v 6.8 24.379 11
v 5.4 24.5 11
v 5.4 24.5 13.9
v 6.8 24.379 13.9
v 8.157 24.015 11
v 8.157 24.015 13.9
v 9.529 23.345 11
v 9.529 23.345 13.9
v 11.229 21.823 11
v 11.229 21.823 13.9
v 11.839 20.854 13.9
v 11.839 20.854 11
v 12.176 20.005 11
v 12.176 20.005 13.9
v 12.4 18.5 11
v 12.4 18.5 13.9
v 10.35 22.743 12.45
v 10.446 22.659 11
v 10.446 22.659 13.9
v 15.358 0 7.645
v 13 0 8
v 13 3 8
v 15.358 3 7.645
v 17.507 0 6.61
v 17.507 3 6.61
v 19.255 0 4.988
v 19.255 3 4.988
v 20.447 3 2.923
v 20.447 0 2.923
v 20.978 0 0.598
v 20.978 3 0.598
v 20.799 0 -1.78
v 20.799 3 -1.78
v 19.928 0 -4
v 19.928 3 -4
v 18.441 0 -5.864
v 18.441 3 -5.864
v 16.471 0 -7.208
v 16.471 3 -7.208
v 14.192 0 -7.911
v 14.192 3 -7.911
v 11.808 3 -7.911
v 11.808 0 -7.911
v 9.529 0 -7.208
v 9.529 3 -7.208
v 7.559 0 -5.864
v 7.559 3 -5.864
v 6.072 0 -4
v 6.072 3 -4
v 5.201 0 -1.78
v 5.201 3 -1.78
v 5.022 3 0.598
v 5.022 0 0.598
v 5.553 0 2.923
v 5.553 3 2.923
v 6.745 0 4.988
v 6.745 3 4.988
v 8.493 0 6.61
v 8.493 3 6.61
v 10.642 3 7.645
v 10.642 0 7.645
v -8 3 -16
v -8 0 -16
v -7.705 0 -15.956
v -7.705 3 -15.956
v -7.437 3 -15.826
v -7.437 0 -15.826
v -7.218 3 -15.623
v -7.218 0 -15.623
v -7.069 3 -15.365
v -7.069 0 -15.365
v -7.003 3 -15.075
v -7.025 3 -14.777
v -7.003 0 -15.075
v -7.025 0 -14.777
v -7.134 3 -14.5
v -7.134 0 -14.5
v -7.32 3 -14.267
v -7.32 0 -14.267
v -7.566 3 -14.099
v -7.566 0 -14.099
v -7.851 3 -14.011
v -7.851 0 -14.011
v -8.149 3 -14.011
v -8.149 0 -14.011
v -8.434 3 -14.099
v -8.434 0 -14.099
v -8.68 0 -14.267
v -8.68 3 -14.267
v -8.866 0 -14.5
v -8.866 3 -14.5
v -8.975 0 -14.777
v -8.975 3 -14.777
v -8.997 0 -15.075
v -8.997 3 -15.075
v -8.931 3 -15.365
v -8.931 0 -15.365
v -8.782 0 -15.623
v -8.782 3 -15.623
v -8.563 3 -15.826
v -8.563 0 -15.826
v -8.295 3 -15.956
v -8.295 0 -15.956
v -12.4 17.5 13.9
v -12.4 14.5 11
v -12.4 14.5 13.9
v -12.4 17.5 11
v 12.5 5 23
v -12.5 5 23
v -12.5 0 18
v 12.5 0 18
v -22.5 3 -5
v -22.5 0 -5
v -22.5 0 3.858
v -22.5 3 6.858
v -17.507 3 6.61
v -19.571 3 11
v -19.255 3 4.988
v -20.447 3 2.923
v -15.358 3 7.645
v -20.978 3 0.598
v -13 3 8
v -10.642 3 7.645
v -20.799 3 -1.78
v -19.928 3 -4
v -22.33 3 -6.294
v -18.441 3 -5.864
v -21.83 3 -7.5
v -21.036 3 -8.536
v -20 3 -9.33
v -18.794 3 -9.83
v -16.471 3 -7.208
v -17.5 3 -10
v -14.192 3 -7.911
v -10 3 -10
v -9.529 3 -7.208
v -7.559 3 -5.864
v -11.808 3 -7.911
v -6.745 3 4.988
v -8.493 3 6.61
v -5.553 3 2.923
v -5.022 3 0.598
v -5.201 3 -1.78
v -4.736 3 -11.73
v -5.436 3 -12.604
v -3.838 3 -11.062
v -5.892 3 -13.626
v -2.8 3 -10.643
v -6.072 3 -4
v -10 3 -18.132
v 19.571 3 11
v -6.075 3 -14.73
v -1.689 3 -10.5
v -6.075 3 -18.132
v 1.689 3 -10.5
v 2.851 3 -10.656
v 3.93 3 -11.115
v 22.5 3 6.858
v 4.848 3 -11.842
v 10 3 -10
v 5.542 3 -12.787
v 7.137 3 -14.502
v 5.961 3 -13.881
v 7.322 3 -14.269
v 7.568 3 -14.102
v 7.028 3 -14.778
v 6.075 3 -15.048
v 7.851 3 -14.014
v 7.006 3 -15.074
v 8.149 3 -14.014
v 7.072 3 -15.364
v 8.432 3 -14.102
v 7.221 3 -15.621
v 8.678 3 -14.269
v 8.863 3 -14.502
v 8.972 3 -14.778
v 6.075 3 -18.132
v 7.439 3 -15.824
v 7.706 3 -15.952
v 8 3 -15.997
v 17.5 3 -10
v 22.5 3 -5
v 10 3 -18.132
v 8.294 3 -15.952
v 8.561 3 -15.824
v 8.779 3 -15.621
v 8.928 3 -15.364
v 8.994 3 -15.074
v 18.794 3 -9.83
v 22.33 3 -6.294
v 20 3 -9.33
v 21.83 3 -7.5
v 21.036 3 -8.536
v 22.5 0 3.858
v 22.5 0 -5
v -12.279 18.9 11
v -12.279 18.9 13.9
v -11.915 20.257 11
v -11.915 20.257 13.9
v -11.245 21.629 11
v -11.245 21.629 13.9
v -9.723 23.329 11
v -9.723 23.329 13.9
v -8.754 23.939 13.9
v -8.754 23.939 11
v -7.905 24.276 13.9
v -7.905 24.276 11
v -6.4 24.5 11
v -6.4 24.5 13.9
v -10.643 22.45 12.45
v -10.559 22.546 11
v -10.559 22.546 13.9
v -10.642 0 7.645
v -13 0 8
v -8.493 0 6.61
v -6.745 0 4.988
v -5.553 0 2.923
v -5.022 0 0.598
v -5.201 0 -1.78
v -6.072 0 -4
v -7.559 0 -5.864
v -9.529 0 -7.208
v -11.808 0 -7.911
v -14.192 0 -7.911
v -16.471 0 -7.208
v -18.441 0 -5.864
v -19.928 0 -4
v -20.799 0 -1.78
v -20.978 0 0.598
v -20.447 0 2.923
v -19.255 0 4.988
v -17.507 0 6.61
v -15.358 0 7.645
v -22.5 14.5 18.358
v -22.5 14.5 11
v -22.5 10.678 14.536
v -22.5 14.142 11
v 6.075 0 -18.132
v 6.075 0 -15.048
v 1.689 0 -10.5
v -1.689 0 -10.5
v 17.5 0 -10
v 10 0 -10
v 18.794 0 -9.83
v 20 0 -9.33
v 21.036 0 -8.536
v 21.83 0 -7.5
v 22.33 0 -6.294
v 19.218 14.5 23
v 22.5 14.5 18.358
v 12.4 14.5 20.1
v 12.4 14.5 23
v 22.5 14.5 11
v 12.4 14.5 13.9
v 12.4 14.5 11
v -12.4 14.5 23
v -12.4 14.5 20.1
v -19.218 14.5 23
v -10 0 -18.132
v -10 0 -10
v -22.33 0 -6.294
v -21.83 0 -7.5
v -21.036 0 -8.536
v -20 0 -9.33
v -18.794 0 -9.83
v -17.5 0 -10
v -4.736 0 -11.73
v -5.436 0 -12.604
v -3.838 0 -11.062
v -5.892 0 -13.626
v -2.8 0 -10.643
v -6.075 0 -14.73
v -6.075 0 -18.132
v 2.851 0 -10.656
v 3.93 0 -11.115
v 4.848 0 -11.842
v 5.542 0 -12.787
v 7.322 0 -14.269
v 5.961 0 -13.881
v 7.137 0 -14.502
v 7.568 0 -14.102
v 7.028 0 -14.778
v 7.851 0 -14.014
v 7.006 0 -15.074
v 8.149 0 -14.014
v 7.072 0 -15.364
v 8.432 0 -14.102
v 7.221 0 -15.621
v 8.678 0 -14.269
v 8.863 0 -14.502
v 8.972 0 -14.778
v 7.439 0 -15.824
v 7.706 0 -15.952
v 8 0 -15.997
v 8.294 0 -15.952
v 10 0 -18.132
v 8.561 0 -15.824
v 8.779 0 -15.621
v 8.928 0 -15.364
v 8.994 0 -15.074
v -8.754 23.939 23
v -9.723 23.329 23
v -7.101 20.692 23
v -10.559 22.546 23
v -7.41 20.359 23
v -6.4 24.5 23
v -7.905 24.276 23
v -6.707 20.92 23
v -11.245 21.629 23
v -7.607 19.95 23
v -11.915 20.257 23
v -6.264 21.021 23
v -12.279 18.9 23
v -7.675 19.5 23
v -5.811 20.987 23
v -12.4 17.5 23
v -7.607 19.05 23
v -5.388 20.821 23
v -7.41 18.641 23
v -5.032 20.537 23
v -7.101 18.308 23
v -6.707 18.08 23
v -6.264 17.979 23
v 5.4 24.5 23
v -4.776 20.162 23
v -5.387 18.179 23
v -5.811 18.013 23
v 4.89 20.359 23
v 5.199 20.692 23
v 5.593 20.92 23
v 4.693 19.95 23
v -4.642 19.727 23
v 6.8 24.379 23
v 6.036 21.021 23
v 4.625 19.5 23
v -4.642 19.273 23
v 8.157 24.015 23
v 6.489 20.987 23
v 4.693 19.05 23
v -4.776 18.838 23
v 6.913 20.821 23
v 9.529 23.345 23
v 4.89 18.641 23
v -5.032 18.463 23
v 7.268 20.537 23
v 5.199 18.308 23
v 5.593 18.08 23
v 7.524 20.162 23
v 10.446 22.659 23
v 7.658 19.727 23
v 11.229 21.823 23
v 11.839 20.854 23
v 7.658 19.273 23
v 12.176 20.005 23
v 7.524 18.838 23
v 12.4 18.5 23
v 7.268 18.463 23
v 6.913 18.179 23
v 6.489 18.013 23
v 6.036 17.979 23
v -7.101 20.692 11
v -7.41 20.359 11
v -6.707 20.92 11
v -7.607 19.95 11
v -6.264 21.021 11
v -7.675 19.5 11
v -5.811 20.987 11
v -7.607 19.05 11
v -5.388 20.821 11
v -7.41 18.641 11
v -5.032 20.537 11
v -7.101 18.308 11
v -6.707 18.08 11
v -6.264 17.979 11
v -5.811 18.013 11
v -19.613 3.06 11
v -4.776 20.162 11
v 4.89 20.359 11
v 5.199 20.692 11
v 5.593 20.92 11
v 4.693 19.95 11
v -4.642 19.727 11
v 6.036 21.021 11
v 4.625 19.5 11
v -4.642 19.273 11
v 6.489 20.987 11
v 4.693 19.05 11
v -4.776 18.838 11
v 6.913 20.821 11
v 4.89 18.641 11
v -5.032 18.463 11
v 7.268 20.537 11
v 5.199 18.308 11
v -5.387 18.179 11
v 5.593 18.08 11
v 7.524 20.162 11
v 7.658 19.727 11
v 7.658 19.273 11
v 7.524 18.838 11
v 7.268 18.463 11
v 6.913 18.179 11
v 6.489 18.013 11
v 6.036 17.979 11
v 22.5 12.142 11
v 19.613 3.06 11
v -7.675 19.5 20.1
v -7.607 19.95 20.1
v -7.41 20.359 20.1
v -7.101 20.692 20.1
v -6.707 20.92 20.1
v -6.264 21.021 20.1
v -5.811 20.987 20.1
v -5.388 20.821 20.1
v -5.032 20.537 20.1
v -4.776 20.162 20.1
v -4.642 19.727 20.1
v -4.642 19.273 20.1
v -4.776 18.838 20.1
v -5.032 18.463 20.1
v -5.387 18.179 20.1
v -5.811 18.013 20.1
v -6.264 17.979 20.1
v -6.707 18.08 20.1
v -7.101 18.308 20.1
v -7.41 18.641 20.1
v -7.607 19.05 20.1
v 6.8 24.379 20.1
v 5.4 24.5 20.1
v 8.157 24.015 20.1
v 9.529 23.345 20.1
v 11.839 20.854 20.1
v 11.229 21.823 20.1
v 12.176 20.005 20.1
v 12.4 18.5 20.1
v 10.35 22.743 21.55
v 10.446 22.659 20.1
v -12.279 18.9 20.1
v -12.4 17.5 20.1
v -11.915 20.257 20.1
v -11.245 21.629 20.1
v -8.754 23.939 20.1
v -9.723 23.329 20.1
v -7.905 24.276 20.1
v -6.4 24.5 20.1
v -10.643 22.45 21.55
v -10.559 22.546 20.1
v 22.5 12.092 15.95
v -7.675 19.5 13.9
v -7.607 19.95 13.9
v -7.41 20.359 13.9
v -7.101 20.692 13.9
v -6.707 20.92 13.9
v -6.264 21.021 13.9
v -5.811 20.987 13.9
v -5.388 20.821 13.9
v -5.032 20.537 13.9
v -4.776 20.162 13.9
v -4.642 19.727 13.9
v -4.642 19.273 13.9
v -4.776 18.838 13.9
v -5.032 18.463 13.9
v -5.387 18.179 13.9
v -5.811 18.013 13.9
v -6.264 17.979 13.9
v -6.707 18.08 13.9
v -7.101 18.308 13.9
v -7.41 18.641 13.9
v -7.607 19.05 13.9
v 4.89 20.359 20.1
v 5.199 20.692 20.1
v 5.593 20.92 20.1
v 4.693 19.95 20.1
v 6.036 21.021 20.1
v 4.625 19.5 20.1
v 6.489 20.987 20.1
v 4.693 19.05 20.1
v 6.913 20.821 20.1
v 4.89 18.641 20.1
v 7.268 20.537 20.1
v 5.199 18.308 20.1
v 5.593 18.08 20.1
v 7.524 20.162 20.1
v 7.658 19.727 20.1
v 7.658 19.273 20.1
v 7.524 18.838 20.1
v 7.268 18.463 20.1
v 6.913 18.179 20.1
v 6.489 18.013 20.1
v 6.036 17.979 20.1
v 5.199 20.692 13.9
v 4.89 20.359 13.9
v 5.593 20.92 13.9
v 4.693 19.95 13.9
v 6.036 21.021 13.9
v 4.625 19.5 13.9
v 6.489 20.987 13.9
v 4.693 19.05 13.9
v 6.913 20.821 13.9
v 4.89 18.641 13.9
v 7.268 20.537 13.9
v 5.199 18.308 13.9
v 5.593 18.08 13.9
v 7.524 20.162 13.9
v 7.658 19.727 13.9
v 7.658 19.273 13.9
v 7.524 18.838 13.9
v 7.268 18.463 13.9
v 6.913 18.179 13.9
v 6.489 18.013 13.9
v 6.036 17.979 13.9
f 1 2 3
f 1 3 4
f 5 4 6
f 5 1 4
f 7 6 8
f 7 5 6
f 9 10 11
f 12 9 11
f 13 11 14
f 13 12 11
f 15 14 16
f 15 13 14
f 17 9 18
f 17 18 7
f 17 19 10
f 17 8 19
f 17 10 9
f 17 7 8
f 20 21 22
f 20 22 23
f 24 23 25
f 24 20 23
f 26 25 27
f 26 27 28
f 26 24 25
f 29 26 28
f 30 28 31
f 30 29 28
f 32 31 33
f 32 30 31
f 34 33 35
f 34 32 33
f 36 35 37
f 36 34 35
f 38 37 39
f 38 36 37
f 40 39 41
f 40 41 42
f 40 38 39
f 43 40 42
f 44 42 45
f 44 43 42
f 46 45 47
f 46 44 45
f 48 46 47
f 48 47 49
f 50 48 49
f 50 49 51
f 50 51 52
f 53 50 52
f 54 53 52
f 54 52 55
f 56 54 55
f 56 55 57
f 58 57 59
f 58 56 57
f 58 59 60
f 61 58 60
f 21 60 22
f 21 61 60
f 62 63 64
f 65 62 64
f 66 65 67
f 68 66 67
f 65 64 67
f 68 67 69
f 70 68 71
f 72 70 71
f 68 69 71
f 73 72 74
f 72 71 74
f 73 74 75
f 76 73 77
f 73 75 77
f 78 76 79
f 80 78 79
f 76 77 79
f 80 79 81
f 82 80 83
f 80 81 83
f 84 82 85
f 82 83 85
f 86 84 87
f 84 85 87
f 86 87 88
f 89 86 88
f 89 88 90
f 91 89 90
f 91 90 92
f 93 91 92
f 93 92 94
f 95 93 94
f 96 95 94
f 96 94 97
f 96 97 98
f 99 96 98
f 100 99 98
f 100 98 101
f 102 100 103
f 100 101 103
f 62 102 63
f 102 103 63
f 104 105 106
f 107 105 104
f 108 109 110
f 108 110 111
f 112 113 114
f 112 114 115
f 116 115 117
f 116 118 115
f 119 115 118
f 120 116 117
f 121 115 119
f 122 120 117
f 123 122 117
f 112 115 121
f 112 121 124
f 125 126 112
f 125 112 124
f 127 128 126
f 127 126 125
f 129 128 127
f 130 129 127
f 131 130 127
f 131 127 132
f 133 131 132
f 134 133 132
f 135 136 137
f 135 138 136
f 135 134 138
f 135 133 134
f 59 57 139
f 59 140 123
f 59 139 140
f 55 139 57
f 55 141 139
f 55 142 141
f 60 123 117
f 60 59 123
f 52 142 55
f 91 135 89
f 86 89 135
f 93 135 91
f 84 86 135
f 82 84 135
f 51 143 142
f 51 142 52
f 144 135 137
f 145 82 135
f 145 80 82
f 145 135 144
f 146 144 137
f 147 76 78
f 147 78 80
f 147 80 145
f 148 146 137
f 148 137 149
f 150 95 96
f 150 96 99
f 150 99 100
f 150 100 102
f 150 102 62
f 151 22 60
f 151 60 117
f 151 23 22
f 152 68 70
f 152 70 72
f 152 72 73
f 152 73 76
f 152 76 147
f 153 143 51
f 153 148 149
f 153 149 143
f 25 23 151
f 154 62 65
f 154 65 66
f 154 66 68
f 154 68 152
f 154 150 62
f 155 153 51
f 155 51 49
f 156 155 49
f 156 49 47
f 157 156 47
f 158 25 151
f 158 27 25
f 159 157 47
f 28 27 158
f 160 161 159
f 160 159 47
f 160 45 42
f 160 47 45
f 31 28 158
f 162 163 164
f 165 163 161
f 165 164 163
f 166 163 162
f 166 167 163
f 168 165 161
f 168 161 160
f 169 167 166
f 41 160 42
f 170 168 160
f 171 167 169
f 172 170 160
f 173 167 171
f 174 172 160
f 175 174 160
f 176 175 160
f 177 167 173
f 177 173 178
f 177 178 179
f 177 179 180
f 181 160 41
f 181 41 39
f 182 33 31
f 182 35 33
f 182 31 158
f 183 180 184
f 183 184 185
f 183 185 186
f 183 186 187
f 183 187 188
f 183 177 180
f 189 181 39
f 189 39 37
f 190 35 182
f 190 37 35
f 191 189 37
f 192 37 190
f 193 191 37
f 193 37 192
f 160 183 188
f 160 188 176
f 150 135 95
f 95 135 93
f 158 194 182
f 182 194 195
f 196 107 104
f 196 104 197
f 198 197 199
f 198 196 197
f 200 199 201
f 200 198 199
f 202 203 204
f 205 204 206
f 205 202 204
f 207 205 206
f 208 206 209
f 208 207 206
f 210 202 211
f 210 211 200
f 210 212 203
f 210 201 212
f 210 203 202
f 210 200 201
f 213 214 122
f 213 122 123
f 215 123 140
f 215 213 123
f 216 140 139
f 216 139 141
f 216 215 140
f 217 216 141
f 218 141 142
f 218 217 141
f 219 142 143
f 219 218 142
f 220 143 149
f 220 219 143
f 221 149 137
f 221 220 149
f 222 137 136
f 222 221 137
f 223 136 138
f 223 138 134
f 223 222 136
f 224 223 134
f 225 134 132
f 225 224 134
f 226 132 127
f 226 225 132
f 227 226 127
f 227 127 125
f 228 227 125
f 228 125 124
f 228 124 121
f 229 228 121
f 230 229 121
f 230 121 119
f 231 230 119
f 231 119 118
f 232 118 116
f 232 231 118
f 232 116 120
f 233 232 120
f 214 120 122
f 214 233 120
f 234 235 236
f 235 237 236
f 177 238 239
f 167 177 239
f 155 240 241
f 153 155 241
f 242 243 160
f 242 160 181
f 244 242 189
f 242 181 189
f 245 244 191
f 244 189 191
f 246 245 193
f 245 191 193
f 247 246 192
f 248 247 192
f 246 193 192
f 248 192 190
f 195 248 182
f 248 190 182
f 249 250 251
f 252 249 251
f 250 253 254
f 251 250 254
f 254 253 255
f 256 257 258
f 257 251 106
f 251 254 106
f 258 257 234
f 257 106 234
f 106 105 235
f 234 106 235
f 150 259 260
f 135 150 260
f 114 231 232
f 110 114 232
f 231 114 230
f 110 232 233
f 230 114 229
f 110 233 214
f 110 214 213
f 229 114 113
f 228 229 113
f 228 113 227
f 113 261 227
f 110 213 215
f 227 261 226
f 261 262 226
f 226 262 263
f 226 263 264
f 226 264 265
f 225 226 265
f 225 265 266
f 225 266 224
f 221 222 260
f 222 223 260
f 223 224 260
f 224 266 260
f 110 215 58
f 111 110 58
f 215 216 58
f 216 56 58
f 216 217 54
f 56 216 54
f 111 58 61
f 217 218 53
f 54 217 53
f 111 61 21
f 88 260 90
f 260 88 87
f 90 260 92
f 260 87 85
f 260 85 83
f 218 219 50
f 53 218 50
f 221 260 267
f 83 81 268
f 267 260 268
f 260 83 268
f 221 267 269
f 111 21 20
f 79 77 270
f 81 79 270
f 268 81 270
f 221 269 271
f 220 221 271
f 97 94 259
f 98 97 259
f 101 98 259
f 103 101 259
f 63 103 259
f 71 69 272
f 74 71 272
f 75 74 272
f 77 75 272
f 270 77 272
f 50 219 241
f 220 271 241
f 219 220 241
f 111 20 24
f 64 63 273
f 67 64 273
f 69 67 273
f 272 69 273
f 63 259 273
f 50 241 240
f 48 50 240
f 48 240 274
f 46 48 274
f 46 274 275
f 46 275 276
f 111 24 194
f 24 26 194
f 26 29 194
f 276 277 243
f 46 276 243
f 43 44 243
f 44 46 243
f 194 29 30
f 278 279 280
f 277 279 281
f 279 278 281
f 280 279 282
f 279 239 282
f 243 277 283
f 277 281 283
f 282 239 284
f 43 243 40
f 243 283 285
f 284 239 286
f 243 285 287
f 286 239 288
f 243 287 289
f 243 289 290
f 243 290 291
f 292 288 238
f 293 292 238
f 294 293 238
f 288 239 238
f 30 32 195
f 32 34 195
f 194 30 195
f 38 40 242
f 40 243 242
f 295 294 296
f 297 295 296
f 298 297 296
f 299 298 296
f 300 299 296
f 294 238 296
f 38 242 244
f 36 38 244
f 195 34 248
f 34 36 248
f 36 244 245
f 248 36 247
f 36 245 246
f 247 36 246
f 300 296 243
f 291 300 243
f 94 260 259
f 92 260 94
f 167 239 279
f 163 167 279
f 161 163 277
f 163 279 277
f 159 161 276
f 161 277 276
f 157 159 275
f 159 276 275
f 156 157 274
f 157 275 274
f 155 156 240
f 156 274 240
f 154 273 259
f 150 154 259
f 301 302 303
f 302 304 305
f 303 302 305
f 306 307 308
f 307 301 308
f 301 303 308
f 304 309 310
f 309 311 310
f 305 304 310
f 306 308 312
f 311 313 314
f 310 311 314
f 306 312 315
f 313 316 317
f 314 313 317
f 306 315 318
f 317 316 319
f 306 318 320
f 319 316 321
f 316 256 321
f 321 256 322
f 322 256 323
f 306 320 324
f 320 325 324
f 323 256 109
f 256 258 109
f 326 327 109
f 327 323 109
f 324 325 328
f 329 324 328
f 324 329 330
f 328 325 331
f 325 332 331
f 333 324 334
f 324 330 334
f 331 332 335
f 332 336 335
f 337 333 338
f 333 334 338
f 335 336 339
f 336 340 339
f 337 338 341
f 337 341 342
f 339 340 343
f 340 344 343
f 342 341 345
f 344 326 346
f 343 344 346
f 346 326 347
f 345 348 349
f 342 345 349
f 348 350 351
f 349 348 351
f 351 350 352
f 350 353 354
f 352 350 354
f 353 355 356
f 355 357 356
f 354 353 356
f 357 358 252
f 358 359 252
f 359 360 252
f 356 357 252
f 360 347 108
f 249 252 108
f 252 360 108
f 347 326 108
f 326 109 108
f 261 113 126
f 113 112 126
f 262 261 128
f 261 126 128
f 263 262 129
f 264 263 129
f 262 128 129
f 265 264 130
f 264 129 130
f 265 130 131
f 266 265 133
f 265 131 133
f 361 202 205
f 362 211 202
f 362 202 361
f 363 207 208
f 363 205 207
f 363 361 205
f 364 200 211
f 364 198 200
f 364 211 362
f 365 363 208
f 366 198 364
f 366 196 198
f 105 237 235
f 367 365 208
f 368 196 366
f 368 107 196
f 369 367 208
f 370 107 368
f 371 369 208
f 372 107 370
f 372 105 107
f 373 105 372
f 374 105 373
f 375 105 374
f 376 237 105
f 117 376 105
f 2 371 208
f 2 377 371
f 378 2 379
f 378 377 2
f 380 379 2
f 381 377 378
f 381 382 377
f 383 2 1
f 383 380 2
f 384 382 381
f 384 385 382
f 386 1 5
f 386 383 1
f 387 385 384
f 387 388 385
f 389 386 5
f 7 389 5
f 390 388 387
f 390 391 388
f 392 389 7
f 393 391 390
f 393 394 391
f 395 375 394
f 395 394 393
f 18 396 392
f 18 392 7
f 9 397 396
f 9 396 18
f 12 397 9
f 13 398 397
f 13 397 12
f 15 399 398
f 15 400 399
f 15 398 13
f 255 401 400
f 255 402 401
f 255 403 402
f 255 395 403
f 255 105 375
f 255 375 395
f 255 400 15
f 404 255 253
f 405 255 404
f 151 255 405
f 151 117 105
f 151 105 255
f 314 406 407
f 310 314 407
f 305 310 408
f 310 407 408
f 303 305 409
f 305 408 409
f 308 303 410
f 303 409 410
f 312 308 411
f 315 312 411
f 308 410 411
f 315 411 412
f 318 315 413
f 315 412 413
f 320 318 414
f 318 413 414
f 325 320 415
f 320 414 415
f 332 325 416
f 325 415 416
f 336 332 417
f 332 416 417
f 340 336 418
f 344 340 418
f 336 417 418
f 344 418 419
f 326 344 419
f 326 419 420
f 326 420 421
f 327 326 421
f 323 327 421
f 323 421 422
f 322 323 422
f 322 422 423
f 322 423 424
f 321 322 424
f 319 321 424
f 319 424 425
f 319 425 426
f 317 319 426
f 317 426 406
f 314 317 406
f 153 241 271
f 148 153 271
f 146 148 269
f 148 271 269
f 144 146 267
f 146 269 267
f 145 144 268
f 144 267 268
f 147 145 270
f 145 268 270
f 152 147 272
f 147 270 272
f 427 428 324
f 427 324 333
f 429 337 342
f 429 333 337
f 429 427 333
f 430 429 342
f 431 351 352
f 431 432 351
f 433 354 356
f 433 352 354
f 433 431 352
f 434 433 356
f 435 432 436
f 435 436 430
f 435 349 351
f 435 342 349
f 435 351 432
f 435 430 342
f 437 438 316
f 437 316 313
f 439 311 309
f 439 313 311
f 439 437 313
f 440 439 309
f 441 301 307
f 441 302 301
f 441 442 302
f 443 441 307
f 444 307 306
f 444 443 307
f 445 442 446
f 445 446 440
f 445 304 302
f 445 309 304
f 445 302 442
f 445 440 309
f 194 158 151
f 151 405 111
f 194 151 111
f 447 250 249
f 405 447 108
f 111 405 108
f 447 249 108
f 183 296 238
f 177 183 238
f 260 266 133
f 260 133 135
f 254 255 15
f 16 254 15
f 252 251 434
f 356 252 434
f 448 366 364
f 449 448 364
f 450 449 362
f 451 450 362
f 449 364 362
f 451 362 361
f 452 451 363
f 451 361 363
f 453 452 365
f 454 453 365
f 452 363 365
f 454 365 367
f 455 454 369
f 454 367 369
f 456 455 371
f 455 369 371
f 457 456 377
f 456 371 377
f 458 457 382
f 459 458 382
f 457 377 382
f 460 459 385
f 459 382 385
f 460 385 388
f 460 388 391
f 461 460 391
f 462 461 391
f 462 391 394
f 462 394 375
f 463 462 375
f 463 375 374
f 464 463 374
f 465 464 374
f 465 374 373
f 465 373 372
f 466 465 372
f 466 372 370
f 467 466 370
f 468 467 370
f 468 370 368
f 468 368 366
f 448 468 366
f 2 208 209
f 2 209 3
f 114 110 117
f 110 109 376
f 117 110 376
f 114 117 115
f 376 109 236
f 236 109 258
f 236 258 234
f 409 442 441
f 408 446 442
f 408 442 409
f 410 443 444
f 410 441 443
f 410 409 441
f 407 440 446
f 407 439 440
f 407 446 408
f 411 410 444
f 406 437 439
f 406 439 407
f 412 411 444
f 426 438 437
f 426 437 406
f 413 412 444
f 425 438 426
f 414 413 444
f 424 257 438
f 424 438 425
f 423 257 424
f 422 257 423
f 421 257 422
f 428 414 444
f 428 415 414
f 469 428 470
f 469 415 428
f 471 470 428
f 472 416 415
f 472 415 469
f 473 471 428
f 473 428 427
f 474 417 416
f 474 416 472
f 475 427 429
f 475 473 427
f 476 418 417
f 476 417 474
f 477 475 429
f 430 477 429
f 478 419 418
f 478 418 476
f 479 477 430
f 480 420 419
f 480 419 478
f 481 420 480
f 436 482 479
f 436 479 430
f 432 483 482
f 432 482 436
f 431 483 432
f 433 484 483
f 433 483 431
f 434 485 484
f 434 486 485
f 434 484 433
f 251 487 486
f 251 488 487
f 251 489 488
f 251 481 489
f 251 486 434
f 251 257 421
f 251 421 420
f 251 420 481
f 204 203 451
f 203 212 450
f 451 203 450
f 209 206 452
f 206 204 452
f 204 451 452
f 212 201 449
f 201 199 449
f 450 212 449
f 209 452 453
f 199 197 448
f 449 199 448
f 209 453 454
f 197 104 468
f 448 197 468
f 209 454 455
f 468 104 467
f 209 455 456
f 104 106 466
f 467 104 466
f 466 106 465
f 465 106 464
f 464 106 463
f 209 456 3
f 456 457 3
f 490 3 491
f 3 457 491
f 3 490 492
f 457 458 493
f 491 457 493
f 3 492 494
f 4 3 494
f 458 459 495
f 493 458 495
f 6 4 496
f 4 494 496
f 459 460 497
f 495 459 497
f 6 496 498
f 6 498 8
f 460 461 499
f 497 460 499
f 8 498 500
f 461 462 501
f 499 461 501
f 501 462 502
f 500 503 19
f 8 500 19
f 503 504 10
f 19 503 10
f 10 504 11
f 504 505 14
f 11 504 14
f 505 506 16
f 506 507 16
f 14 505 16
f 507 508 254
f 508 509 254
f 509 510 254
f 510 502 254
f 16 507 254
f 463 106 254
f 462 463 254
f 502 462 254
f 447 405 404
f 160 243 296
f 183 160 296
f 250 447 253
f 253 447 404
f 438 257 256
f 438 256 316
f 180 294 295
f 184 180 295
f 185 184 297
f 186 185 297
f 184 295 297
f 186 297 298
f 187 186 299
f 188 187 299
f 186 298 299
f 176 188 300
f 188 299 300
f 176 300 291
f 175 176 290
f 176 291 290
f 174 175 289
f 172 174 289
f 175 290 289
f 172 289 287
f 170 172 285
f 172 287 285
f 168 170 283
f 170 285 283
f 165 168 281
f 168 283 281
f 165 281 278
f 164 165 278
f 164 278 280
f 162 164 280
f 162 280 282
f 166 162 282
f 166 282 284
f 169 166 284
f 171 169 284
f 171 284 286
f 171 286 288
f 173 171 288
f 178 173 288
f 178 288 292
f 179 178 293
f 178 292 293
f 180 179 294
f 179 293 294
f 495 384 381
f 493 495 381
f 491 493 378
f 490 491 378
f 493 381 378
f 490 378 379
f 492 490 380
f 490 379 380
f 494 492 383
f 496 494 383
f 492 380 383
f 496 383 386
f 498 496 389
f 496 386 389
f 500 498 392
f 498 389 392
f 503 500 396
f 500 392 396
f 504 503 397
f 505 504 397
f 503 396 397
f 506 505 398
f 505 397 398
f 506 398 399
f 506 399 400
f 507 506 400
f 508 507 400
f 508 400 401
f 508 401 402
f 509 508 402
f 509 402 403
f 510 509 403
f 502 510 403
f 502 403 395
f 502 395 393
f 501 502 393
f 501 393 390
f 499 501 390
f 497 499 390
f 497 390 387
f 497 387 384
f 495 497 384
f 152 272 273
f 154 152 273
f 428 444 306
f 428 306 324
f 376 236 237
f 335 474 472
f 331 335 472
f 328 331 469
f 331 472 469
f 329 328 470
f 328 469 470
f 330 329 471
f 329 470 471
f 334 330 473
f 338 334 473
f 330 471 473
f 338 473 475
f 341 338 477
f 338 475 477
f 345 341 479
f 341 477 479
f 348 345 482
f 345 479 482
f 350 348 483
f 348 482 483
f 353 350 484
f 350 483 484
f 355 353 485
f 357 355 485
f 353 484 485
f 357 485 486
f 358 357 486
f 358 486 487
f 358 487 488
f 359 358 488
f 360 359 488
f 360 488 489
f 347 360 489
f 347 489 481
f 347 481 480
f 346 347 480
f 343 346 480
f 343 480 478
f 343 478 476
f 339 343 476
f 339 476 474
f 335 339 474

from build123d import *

# Parameters (mm, degrees)
SKETCH1_W           = 45
SKETCH1_H           = 20
SKETCH1_R           = 8
SKETCH1_H_2         = 13
SKETCH1_H_3         = 1
BOSS_EXTRUDE1_DEPTH = 3
SKETCH3_W           = 45
SKETCH3_H           = 2.9
SKETCH3_H_2         = 6.2
BOSS_EXTRUDE2_DEPTH = 11.5
SKETCH3_3_W         = 45
SKETCH3_3_H         = 2.9
BOSS_EXTRUDE3_DEPTH = 21.5
SKETCH6_R           = 1.525
SKETCH6_W           = 10.1
SKETCH6_H           = 10
CUT_EXTRUDE2_DEPTH  = 16.5
CHAMFER1_SIZE       = 5
FILLET2_R           = 5
FILLET3_SIZE        = 7
FILLET3_SIZE_2      = 6
SKETCH7_R           = 0.996709825
SKETCH7_R_2         = 1
BOSS_EXTRUDE4_DEPTH = 3
CHAMFER2_SIZE       = 10
CHAMFER3_SIZE       = 10
CHAMFER4_START      = 17.731133084
CHAMFER4_DEPTH      = 3.699865449
CHAMFER5_START      = -16.752681828
CHAMFER5_DEPTH      = 1.71299366


with BuildPart() as part:
    # Sketch1 → Boss-Extrude1 (new body)
    # profile 1 of 3: a face of its own
    with BuildSketch(Plane(origin=(0, 0, 0), x_dir=(1, 0, 0), z_dir=(0, 1, 0))):
        Rectangle(SKETCH1_W, SKETCH1_H)
        with Locations(Location((13, 0, 0), (0, 0, 270))):
            Circle(SKETCH1_R, mode=Mode.SUBTRACT)
        with Locations(Location((-13, 0, 0), (0, 0, 270))):
            Circle(SKETCH1_R, mode=Mode.SUBTRACT)
    # profile 2 of 3: a face of its own
    with BuildSketch(Plane(origin=(0, 0, 0), x_dir=(1, 0, 0), z_dir=(0, 1, 0))):
        with Locations((0, -16.5)):
            Rectangle(SKETCH1_W, SKETCH1_H_2)
    # profile 3 of 3: a face of its own
    with BuildSketch(Plane(origin=(0, 0, 0), x_dir=(1, 0, 0), z_dir=(0, 1, 0))):
        with Locations((0, -10.5)):
            Rectangle(SKETCH1_W, SKETCH1_H_3)
    extrude(amount=BOSS_EXTRUDE1_DEPTH)

    # Sketch3 → Boss-Extrude2 (add)
    with BuildSketch(Plane(origin=(0, 3, 0), x_dir=(1, 0, 0), z_dir=(0, 1, 0))):
        with Locations((0, -21.55)):
            Rectangle(SKETCH3_W, SKETCH3_H)
        with Locations((0, -17)):
            Rectangle(SKETCH3_W, SKETCH3_H_2)
        with Locations((0, -12.45)):
            Rectangle(SKETCH3_W, SKETCH3_H)
    extrude(amount=BOSS_EXTRUDE2_DEPTH)

    # Sketch3<3> → Boss-Extrude3 (add)
    with BuildSketch(Plane(origin=(0, 3, 0), x_dir=(1, 0, 0), z_dir=(0, 1, 0))):
        with Locations((0, -12.45)):
            Rectangle(SKETCH3_3_W, SKETCH3_3_H)
        with Locations((0, -21.55)):
            Rectangle(SKETCH3_3_W, SKETCH3_3_H)
    extrude(amount=BOSS_EXTRUDE3_DEPTH)

    # Sketch6 → Cut-Extrude2 (cut)
    with BuildSketch(Plane(origin=(0, 0, 11), x_dir=(-1, 0, 0), z_dir=(0, 0, -1))):
        with Locations((-6.15, 19.5)):
            Circle(SKETCH6_R)
        with Locations((6.15, 19.5)):
            Circle(SKETCH6_R)
        with Locations((-17.45, 19.5)):
            Rectangle(SKETCH6_W, SKETCH6_H)
        with Locations((17.45, 19.5)):
            Rectangle(SKETCH6_W, SKETCH6_H)
    extrude(amount=-CUT_EXTRUDE2_DEPTH, mode=Mode.SUBTRACT)

    # Chamfer1
    chamfer1_edges = [part.edges().sort_by_distance(p)[0] for p in [
        (0, 0, 23),
    ]]
    chamfer(chamfer1_edges, length=CHAMFER1_SIZE)

    # Fillet2
    fillet2_edges = [part.edges().sort_by_distance(p)[0] for p in [
        (-22.5, 1.5, -10),
        (22.5, 1.5, -10),
    ]]
    fillet(fillet2_edges, radius=FILLET2_R)

    # Fillet3
    # a fillet whose section is not a circle: 7, 6 mm, written as the material it takes off along each edge
    with BuildSketch(Plane(origin=(12.4, 24.5, -6.5), x_dir=(-1, 0, 0), z_dir=(0, 0, 1)), Plane(origin=(-12.4, 24.5, -6.5), x_dir=(0, -1, 0), z_dir=(0, 0, 1))) as fillet3_piece_1:
        with BuildLine():
            Bezier((FILLET3_SIZE, 0), (0, 0), (0, FILLET3_SIZE_2), weights=[1, 0.707106781, 1])
            Line((0, FILLET3_SIZE_2), (0, 0))
            Line((0, 0), (FILLET3_SIZE, 0))
        make_face()
    extrude(amount=37.9, mode=Mode.SUBTRACT)
    with BuildSketch(Plane(origin=(12.4, 24.5, 2.6), x_dir=(0, -1, 0), z_dir=(0, 0, 1)), Plane(origin=(-12.4, 24.5, 2.6), x_dir=(1, 0, 0), z_dir=(0, 0, 1))) as fillet3_piece_2:
        with BuildLine():
            Bezier((FILLET3_SIZE_2, 0), (0, 0), (0, -FILLET3_SIZE), weights=[1, 0.707106781, 1])
            Line((0, -FILLET3_SIZE), (0, 0))
            Line((0, 0), (FILLET3_SIZE_2, 0))
        make_face()
    extrude(amount=37.9, mode=Mode.SUBTRACT)

    # Sketch7 → Boss-Extrude4 (add)
    with BuildSketch(Plane.XZ):
        with BuildLine():
            Line((-10, -10), (10, -10))
            Line((10, -10), (10, -18.132118098))
            Line((10, -18.132118098), (6.075, -18.132118098))
            Line((6.075, -18.132118098), (6.075, -15.047815402))
            ThreePointArc((6.075, -15.047815402), (4.848419821, -11.842215517), (1.689491671, -10.5))
            Line((1.689491671, -10.5), (-1.689458819, -10.5))
            ThreePointArc((-1.689458819, -10.5), (-4.736103523, -11.729921298), (-6.075, -14.730272374))
            Line((-6.075, -14.730272374), (-6.075, -18.132118098))
            Line((-6.075, -18.132118098), (-10, -18.132118098))
            Line((-10, -18.132118098), (-10, -10))
        make_face()
        with Locations(Location((8, -15, 0), (0, 0, 270))):
            Circle(SKETCH7_R, mode=Mode.SUBTRACT)
        with Locations(Location((-8, -15, 0), (0, 0, 270))):
            Circle(SKETCH7_R_2, mode=Mode.SUBTRACT)
    extrude(amount=-BOSS_EXTRUDE4_DEPTH)

    # Chamfer2
    # the kernel refuses this chamfer: 10 mm, written as the material it takes off along each edge
    with BuildSketch(Plane(origin=(22.5, 23.184544799, 41.184544799), x_dir=(0, 0.7071067811865476, -0.7071067811865476), z_dir=(0, -0.7071067811865476, -0.7071067811865476))) as chamfer2_piece_1:
        Polygon((CHAMFER2_SIZE, 0), (0, -CHAMFER2_SIZE), (0, 0), align=None)
    extrude(amount=58.504727571, mode=Mode.SUBTRACT)

    # Chamfer3
    # the kernel refuses this chamfer: 10 mm, written as the material it takes off along each edge
    with BuildSketch(Plane(origin=(-22.5, 23.184544799, 41.184544799), x_dir=(1, 0, 0), z_dir=(0, -0.7071067811865476, -0.7071067811865476))) as chamfer3_piece_1:
        Polygon((CHAMFER3_SIZE, 0), (0, -CHAMFER3_SIZE), (0, 0), align=None)
    extrude(amount=58.504727571, mode=Mode.SUBTRACT)

    # Chamfer4: read off the stored shape, not the designer's step
    # Chamfer4 outline → Chamfer4 (cut)
    with BuildSketch(Plane(origin=(0, 0, 0), x_dir=(0.3029024372169638, 0.9530210691127028, -0.0009774227869083028), z_dir=(0.9530161074355918, -0.302904014214538, -0.0030752464993570898)).offset(CHAMFER4_START)):
        Polygon((8.846062674, 11.063231546), (18.37626426, 11.072546631), (18.323534543, 16.02226833), align=None)
    extrude(amount=CHAMFER4_DEPTH, mode=Mode.SUBTRACT)

    # Chamfer5: read off the stored shape, not the designer's step
    # Chamfer5 outline → Chamfer5 (cut)
    with BuildSketch(Plane(origin=(0, 0, 0), x_dir=(-0.2371114626358165, 0.9695954628947141, -0.06052100974611115), z_dir=(0.9394753911891737, 0.24471337996518516, 0.2397943932121102)).offset(CHAMFER5_START)):
        Polygon((18.381427339, 16.222851439), (14.80832265, 19.648555484), (6.951420363, 15.508917831), align=None)
    extrude(amount=CHAMFER5_DEPTH, mode=Mode.SUBTRACT)


solid = part.part
